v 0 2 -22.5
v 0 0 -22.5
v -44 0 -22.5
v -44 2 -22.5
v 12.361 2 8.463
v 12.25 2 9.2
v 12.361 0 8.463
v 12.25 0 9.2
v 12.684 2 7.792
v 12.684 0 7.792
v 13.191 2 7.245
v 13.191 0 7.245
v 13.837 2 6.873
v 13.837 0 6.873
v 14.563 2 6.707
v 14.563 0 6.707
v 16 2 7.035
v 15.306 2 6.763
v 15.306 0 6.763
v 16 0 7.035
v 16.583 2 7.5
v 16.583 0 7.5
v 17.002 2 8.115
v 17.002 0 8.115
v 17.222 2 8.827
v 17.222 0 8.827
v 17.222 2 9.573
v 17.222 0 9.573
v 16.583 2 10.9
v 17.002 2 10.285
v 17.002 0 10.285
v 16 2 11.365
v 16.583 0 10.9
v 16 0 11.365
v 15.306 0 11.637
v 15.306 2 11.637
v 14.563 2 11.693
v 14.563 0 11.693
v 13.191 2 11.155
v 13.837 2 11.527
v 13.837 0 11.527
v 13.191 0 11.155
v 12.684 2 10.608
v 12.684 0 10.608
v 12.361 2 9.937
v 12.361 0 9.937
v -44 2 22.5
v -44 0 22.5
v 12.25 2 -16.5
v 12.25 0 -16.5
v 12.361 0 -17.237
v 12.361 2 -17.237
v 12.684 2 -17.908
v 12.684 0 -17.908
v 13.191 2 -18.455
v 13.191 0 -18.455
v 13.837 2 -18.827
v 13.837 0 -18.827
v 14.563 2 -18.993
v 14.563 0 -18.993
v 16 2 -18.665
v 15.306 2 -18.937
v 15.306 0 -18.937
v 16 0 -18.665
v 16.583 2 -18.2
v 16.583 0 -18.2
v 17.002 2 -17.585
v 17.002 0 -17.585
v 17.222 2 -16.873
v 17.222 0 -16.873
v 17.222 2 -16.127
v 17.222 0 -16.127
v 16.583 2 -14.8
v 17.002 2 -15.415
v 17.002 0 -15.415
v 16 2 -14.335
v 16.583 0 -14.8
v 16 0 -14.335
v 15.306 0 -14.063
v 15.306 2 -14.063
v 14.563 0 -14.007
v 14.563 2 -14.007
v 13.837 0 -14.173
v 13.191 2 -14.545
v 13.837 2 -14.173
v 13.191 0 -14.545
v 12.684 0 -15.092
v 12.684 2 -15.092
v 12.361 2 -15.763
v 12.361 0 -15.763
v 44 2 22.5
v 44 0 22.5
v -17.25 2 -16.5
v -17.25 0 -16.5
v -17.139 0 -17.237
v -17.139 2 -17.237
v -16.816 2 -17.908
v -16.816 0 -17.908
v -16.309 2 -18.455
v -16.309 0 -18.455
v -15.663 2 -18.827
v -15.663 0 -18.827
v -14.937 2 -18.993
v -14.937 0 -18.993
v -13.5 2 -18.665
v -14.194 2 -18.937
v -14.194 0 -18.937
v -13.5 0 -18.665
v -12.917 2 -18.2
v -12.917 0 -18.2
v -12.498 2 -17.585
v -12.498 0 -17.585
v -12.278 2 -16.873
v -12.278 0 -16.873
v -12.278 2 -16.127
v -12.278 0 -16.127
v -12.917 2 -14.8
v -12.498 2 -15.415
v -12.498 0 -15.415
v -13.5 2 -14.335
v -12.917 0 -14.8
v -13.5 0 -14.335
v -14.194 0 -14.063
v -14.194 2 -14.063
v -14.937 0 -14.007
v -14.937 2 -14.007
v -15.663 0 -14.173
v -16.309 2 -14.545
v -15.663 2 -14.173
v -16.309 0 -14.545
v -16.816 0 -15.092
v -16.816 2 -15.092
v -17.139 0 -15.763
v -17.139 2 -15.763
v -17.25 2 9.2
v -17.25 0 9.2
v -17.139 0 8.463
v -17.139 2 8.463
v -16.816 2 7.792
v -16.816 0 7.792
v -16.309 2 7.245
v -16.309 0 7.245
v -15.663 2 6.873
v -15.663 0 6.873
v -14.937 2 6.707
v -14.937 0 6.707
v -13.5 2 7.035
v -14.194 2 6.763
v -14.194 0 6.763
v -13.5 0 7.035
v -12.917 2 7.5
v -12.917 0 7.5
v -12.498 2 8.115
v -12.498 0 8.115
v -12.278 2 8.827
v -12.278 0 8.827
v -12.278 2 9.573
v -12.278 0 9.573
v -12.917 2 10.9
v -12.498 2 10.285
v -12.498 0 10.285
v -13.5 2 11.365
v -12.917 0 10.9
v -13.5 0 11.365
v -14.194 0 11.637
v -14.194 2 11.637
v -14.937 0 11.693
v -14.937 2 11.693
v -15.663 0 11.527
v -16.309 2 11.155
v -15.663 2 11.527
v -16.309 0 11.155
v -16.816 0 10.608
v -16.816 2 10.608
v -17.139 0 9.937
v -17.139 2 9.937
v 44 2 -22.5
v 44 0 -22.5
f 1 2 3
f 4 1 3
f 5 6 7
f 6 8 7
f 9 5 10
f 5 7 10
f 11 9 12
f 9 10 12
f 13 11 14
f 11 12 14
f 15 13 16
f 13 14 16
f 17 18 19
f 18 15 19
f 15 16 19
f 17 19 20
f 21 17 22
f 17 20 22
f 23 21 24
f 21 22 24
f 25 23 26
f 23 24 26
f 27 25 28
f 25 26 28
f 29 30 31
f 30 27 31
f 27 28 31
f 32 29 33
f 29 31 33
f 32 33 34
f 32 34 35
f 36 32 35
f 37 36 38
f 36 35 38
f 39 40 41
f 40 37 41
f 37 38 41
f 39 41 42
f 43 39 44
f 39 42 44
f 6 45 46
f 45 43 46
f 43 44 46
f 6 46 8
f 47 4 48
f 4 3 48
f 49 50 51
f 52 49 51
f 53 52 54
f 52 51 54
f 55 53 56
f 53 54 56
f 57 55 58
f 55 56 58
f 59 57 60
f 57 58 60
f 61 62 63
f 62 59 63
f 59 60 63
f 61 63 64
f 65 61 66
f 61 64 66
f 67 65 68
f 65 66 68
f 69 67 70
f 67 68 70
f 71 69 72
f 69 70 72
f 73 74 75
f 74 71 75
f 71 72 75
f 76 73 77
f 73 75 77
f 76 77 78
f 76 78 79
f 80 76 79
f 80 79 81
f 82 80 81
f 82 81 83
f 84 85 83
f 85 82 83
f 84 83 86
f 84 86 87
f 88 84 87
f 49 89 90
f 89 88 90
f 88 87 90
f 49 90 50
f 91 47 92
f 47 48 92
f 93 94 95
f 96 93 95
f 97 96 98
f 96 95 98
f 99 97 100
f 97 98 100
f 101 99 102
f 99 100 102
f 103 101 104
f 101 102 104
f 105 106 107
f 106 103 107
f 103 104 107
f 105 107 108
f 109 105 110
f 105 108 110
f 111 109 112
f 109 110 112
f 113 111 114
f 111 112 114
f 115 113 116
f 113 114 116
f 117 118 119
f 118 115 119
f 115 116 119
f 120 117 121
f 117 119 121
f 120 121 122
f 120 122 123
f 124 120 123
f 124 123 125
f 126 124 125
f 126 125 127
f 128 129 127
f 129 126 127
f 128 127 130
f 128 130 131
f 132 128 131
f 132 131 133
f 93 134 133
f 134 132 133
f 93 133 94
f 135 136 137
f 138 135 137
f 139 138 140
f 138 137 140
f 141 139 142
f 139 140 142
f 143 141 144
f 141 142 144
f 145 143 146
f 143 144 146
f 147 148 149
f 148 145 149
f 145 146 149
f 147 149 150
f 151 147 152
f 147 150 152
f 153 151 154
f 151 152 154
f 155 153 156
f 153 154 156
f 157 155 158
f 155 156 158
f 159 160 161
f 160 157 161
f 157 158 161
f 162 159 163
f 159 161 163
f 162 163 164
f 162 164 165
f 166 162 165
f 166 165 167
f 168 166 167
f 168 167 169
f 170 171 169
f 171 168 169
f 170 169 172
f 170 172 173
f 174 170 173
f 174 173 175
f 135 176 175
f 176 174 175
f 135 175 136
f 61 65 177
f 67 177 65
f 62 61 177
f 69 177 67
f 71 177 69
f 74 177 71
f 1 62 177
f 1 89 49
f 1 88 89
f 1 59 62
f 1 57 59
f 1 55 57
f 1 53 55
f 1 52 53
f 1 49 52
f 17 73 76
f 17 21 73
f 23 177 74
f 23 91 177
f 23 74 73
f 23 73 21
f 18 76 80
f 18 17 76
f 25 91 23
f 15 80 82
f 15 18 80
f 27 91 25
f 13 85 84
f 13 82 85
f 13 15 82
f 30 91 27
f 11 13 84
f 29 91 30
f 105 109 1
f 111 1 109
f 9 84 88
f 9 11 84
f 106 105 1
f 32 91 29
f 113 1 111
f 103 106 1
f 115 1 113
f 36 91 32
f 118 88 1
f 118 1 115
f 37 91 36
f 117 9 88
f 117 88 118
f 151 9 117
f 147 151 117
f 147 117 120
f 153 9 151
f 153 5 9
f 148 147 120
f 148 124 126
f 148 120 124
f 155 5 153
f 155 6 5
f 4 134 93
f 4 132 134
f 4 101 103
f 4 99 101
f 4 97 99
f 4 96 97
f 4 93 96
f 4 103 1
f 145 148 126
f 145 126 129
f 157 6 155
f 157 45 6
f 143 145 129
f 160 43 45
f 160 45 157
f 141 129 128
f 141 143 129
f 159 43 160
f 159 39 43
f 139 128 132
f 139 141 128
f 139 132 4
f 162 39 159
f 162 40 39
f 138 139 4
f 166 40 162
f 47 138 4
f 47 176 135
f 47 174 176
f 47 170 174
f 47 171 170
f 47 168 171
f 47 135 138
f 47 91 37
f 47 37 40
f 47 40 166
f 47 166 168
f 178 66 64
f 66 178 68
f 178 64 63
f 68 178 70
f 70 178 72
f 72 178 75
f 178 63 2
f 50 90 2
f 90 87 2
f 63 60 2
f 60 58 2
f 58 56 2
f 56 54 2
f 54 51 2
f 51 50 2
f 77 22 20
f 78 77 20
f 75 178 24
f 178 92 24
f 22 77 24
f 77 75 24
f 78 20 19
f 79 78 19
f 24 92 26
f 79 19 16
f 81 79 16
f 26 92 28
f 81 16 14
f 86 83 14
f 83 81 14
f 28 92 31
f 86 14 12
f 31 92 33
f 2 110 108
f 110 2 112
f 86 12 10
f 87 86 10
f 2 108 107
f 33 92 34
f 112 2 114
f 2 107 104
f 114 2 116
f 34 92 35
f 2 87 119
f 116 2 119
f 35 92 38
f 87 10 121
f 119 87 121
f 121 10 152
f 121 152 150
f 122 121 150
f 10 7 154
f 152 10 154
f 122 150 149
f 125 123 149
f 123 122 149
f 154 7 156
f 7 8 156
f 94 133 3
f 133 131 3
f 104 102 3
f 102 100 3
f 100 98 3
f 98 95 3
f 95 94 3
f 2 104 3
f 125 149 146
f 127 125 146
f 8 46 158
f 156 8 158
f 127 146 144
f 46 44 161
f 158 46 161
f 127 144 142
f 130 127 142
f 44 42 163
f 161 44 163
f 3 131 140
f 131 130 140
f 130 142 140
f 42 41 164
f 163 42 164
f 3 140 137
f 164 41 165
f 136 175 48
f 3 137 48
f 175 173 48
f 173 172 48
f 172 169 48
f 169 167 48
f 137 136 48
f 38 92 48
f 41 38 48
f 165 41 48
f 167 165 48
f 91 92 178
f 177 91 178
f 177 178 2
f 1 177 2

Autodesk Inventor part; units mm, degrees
ref_plane "YZ Plane" through (0, 0, 0) normal (1, 0, 0) x (0, 1, 0)
ref_plane "XZ Plane" through (0, 0, 0) normal (0, 1, 0) x (-1, 0, 0)
ref_plane "XY Plane" through (0, 0, 0) normal (0, 0, 1) x (1, 0, 0)
sketch "Boceto1" plane through (0, 0, 0) normal (0, 1, 0) x (-1, 0, 0)
  line L0 (44, 22.5) -> (-44, 22.5)
  line L1 (-44, 22.5) -> (-44, -22.5)
  line L2 (-44, -22.5) -> (44, -22.5)
  line L3 (44, -22.5) -> (44, 22.5)
  line L4 (44, 22.5) -> (-44, -22.5) construction
  circle A0 centre (14.75, -16.5) radius 2.5
  circle A1 centre (14.75, 9.2) radius 2.5
  line L5 (14.75, -16.5) -> (-14.75, -16.5) construction
  line L6 (-14.75, -16.5) -> (-14.75, 9.2) construction
  line L7 (-14.75, 9.2) -> (14.75, 9.2) construction
  line L8 (14.75, 9.2) -> (14.75, -16.5) construction
  line L9 (0, 0) -> (0, -30.1177)
  circle A2 centre (-14.75, -16.5) radius 2.5
  circle A3 centre (-14.75, 9.2) radius 2.5
  dimension "d0" = 88
  dimension "d1" = 45
  dimension "d4" = 5
  dimension "d5" = 25.7
  dimension "d6" = 6
  dimension "d7" = 29.5
extrude "Extrusión1" add sketch "Boceto1" along normal blind 2
properties part number "PlacaSTC-HH20"
